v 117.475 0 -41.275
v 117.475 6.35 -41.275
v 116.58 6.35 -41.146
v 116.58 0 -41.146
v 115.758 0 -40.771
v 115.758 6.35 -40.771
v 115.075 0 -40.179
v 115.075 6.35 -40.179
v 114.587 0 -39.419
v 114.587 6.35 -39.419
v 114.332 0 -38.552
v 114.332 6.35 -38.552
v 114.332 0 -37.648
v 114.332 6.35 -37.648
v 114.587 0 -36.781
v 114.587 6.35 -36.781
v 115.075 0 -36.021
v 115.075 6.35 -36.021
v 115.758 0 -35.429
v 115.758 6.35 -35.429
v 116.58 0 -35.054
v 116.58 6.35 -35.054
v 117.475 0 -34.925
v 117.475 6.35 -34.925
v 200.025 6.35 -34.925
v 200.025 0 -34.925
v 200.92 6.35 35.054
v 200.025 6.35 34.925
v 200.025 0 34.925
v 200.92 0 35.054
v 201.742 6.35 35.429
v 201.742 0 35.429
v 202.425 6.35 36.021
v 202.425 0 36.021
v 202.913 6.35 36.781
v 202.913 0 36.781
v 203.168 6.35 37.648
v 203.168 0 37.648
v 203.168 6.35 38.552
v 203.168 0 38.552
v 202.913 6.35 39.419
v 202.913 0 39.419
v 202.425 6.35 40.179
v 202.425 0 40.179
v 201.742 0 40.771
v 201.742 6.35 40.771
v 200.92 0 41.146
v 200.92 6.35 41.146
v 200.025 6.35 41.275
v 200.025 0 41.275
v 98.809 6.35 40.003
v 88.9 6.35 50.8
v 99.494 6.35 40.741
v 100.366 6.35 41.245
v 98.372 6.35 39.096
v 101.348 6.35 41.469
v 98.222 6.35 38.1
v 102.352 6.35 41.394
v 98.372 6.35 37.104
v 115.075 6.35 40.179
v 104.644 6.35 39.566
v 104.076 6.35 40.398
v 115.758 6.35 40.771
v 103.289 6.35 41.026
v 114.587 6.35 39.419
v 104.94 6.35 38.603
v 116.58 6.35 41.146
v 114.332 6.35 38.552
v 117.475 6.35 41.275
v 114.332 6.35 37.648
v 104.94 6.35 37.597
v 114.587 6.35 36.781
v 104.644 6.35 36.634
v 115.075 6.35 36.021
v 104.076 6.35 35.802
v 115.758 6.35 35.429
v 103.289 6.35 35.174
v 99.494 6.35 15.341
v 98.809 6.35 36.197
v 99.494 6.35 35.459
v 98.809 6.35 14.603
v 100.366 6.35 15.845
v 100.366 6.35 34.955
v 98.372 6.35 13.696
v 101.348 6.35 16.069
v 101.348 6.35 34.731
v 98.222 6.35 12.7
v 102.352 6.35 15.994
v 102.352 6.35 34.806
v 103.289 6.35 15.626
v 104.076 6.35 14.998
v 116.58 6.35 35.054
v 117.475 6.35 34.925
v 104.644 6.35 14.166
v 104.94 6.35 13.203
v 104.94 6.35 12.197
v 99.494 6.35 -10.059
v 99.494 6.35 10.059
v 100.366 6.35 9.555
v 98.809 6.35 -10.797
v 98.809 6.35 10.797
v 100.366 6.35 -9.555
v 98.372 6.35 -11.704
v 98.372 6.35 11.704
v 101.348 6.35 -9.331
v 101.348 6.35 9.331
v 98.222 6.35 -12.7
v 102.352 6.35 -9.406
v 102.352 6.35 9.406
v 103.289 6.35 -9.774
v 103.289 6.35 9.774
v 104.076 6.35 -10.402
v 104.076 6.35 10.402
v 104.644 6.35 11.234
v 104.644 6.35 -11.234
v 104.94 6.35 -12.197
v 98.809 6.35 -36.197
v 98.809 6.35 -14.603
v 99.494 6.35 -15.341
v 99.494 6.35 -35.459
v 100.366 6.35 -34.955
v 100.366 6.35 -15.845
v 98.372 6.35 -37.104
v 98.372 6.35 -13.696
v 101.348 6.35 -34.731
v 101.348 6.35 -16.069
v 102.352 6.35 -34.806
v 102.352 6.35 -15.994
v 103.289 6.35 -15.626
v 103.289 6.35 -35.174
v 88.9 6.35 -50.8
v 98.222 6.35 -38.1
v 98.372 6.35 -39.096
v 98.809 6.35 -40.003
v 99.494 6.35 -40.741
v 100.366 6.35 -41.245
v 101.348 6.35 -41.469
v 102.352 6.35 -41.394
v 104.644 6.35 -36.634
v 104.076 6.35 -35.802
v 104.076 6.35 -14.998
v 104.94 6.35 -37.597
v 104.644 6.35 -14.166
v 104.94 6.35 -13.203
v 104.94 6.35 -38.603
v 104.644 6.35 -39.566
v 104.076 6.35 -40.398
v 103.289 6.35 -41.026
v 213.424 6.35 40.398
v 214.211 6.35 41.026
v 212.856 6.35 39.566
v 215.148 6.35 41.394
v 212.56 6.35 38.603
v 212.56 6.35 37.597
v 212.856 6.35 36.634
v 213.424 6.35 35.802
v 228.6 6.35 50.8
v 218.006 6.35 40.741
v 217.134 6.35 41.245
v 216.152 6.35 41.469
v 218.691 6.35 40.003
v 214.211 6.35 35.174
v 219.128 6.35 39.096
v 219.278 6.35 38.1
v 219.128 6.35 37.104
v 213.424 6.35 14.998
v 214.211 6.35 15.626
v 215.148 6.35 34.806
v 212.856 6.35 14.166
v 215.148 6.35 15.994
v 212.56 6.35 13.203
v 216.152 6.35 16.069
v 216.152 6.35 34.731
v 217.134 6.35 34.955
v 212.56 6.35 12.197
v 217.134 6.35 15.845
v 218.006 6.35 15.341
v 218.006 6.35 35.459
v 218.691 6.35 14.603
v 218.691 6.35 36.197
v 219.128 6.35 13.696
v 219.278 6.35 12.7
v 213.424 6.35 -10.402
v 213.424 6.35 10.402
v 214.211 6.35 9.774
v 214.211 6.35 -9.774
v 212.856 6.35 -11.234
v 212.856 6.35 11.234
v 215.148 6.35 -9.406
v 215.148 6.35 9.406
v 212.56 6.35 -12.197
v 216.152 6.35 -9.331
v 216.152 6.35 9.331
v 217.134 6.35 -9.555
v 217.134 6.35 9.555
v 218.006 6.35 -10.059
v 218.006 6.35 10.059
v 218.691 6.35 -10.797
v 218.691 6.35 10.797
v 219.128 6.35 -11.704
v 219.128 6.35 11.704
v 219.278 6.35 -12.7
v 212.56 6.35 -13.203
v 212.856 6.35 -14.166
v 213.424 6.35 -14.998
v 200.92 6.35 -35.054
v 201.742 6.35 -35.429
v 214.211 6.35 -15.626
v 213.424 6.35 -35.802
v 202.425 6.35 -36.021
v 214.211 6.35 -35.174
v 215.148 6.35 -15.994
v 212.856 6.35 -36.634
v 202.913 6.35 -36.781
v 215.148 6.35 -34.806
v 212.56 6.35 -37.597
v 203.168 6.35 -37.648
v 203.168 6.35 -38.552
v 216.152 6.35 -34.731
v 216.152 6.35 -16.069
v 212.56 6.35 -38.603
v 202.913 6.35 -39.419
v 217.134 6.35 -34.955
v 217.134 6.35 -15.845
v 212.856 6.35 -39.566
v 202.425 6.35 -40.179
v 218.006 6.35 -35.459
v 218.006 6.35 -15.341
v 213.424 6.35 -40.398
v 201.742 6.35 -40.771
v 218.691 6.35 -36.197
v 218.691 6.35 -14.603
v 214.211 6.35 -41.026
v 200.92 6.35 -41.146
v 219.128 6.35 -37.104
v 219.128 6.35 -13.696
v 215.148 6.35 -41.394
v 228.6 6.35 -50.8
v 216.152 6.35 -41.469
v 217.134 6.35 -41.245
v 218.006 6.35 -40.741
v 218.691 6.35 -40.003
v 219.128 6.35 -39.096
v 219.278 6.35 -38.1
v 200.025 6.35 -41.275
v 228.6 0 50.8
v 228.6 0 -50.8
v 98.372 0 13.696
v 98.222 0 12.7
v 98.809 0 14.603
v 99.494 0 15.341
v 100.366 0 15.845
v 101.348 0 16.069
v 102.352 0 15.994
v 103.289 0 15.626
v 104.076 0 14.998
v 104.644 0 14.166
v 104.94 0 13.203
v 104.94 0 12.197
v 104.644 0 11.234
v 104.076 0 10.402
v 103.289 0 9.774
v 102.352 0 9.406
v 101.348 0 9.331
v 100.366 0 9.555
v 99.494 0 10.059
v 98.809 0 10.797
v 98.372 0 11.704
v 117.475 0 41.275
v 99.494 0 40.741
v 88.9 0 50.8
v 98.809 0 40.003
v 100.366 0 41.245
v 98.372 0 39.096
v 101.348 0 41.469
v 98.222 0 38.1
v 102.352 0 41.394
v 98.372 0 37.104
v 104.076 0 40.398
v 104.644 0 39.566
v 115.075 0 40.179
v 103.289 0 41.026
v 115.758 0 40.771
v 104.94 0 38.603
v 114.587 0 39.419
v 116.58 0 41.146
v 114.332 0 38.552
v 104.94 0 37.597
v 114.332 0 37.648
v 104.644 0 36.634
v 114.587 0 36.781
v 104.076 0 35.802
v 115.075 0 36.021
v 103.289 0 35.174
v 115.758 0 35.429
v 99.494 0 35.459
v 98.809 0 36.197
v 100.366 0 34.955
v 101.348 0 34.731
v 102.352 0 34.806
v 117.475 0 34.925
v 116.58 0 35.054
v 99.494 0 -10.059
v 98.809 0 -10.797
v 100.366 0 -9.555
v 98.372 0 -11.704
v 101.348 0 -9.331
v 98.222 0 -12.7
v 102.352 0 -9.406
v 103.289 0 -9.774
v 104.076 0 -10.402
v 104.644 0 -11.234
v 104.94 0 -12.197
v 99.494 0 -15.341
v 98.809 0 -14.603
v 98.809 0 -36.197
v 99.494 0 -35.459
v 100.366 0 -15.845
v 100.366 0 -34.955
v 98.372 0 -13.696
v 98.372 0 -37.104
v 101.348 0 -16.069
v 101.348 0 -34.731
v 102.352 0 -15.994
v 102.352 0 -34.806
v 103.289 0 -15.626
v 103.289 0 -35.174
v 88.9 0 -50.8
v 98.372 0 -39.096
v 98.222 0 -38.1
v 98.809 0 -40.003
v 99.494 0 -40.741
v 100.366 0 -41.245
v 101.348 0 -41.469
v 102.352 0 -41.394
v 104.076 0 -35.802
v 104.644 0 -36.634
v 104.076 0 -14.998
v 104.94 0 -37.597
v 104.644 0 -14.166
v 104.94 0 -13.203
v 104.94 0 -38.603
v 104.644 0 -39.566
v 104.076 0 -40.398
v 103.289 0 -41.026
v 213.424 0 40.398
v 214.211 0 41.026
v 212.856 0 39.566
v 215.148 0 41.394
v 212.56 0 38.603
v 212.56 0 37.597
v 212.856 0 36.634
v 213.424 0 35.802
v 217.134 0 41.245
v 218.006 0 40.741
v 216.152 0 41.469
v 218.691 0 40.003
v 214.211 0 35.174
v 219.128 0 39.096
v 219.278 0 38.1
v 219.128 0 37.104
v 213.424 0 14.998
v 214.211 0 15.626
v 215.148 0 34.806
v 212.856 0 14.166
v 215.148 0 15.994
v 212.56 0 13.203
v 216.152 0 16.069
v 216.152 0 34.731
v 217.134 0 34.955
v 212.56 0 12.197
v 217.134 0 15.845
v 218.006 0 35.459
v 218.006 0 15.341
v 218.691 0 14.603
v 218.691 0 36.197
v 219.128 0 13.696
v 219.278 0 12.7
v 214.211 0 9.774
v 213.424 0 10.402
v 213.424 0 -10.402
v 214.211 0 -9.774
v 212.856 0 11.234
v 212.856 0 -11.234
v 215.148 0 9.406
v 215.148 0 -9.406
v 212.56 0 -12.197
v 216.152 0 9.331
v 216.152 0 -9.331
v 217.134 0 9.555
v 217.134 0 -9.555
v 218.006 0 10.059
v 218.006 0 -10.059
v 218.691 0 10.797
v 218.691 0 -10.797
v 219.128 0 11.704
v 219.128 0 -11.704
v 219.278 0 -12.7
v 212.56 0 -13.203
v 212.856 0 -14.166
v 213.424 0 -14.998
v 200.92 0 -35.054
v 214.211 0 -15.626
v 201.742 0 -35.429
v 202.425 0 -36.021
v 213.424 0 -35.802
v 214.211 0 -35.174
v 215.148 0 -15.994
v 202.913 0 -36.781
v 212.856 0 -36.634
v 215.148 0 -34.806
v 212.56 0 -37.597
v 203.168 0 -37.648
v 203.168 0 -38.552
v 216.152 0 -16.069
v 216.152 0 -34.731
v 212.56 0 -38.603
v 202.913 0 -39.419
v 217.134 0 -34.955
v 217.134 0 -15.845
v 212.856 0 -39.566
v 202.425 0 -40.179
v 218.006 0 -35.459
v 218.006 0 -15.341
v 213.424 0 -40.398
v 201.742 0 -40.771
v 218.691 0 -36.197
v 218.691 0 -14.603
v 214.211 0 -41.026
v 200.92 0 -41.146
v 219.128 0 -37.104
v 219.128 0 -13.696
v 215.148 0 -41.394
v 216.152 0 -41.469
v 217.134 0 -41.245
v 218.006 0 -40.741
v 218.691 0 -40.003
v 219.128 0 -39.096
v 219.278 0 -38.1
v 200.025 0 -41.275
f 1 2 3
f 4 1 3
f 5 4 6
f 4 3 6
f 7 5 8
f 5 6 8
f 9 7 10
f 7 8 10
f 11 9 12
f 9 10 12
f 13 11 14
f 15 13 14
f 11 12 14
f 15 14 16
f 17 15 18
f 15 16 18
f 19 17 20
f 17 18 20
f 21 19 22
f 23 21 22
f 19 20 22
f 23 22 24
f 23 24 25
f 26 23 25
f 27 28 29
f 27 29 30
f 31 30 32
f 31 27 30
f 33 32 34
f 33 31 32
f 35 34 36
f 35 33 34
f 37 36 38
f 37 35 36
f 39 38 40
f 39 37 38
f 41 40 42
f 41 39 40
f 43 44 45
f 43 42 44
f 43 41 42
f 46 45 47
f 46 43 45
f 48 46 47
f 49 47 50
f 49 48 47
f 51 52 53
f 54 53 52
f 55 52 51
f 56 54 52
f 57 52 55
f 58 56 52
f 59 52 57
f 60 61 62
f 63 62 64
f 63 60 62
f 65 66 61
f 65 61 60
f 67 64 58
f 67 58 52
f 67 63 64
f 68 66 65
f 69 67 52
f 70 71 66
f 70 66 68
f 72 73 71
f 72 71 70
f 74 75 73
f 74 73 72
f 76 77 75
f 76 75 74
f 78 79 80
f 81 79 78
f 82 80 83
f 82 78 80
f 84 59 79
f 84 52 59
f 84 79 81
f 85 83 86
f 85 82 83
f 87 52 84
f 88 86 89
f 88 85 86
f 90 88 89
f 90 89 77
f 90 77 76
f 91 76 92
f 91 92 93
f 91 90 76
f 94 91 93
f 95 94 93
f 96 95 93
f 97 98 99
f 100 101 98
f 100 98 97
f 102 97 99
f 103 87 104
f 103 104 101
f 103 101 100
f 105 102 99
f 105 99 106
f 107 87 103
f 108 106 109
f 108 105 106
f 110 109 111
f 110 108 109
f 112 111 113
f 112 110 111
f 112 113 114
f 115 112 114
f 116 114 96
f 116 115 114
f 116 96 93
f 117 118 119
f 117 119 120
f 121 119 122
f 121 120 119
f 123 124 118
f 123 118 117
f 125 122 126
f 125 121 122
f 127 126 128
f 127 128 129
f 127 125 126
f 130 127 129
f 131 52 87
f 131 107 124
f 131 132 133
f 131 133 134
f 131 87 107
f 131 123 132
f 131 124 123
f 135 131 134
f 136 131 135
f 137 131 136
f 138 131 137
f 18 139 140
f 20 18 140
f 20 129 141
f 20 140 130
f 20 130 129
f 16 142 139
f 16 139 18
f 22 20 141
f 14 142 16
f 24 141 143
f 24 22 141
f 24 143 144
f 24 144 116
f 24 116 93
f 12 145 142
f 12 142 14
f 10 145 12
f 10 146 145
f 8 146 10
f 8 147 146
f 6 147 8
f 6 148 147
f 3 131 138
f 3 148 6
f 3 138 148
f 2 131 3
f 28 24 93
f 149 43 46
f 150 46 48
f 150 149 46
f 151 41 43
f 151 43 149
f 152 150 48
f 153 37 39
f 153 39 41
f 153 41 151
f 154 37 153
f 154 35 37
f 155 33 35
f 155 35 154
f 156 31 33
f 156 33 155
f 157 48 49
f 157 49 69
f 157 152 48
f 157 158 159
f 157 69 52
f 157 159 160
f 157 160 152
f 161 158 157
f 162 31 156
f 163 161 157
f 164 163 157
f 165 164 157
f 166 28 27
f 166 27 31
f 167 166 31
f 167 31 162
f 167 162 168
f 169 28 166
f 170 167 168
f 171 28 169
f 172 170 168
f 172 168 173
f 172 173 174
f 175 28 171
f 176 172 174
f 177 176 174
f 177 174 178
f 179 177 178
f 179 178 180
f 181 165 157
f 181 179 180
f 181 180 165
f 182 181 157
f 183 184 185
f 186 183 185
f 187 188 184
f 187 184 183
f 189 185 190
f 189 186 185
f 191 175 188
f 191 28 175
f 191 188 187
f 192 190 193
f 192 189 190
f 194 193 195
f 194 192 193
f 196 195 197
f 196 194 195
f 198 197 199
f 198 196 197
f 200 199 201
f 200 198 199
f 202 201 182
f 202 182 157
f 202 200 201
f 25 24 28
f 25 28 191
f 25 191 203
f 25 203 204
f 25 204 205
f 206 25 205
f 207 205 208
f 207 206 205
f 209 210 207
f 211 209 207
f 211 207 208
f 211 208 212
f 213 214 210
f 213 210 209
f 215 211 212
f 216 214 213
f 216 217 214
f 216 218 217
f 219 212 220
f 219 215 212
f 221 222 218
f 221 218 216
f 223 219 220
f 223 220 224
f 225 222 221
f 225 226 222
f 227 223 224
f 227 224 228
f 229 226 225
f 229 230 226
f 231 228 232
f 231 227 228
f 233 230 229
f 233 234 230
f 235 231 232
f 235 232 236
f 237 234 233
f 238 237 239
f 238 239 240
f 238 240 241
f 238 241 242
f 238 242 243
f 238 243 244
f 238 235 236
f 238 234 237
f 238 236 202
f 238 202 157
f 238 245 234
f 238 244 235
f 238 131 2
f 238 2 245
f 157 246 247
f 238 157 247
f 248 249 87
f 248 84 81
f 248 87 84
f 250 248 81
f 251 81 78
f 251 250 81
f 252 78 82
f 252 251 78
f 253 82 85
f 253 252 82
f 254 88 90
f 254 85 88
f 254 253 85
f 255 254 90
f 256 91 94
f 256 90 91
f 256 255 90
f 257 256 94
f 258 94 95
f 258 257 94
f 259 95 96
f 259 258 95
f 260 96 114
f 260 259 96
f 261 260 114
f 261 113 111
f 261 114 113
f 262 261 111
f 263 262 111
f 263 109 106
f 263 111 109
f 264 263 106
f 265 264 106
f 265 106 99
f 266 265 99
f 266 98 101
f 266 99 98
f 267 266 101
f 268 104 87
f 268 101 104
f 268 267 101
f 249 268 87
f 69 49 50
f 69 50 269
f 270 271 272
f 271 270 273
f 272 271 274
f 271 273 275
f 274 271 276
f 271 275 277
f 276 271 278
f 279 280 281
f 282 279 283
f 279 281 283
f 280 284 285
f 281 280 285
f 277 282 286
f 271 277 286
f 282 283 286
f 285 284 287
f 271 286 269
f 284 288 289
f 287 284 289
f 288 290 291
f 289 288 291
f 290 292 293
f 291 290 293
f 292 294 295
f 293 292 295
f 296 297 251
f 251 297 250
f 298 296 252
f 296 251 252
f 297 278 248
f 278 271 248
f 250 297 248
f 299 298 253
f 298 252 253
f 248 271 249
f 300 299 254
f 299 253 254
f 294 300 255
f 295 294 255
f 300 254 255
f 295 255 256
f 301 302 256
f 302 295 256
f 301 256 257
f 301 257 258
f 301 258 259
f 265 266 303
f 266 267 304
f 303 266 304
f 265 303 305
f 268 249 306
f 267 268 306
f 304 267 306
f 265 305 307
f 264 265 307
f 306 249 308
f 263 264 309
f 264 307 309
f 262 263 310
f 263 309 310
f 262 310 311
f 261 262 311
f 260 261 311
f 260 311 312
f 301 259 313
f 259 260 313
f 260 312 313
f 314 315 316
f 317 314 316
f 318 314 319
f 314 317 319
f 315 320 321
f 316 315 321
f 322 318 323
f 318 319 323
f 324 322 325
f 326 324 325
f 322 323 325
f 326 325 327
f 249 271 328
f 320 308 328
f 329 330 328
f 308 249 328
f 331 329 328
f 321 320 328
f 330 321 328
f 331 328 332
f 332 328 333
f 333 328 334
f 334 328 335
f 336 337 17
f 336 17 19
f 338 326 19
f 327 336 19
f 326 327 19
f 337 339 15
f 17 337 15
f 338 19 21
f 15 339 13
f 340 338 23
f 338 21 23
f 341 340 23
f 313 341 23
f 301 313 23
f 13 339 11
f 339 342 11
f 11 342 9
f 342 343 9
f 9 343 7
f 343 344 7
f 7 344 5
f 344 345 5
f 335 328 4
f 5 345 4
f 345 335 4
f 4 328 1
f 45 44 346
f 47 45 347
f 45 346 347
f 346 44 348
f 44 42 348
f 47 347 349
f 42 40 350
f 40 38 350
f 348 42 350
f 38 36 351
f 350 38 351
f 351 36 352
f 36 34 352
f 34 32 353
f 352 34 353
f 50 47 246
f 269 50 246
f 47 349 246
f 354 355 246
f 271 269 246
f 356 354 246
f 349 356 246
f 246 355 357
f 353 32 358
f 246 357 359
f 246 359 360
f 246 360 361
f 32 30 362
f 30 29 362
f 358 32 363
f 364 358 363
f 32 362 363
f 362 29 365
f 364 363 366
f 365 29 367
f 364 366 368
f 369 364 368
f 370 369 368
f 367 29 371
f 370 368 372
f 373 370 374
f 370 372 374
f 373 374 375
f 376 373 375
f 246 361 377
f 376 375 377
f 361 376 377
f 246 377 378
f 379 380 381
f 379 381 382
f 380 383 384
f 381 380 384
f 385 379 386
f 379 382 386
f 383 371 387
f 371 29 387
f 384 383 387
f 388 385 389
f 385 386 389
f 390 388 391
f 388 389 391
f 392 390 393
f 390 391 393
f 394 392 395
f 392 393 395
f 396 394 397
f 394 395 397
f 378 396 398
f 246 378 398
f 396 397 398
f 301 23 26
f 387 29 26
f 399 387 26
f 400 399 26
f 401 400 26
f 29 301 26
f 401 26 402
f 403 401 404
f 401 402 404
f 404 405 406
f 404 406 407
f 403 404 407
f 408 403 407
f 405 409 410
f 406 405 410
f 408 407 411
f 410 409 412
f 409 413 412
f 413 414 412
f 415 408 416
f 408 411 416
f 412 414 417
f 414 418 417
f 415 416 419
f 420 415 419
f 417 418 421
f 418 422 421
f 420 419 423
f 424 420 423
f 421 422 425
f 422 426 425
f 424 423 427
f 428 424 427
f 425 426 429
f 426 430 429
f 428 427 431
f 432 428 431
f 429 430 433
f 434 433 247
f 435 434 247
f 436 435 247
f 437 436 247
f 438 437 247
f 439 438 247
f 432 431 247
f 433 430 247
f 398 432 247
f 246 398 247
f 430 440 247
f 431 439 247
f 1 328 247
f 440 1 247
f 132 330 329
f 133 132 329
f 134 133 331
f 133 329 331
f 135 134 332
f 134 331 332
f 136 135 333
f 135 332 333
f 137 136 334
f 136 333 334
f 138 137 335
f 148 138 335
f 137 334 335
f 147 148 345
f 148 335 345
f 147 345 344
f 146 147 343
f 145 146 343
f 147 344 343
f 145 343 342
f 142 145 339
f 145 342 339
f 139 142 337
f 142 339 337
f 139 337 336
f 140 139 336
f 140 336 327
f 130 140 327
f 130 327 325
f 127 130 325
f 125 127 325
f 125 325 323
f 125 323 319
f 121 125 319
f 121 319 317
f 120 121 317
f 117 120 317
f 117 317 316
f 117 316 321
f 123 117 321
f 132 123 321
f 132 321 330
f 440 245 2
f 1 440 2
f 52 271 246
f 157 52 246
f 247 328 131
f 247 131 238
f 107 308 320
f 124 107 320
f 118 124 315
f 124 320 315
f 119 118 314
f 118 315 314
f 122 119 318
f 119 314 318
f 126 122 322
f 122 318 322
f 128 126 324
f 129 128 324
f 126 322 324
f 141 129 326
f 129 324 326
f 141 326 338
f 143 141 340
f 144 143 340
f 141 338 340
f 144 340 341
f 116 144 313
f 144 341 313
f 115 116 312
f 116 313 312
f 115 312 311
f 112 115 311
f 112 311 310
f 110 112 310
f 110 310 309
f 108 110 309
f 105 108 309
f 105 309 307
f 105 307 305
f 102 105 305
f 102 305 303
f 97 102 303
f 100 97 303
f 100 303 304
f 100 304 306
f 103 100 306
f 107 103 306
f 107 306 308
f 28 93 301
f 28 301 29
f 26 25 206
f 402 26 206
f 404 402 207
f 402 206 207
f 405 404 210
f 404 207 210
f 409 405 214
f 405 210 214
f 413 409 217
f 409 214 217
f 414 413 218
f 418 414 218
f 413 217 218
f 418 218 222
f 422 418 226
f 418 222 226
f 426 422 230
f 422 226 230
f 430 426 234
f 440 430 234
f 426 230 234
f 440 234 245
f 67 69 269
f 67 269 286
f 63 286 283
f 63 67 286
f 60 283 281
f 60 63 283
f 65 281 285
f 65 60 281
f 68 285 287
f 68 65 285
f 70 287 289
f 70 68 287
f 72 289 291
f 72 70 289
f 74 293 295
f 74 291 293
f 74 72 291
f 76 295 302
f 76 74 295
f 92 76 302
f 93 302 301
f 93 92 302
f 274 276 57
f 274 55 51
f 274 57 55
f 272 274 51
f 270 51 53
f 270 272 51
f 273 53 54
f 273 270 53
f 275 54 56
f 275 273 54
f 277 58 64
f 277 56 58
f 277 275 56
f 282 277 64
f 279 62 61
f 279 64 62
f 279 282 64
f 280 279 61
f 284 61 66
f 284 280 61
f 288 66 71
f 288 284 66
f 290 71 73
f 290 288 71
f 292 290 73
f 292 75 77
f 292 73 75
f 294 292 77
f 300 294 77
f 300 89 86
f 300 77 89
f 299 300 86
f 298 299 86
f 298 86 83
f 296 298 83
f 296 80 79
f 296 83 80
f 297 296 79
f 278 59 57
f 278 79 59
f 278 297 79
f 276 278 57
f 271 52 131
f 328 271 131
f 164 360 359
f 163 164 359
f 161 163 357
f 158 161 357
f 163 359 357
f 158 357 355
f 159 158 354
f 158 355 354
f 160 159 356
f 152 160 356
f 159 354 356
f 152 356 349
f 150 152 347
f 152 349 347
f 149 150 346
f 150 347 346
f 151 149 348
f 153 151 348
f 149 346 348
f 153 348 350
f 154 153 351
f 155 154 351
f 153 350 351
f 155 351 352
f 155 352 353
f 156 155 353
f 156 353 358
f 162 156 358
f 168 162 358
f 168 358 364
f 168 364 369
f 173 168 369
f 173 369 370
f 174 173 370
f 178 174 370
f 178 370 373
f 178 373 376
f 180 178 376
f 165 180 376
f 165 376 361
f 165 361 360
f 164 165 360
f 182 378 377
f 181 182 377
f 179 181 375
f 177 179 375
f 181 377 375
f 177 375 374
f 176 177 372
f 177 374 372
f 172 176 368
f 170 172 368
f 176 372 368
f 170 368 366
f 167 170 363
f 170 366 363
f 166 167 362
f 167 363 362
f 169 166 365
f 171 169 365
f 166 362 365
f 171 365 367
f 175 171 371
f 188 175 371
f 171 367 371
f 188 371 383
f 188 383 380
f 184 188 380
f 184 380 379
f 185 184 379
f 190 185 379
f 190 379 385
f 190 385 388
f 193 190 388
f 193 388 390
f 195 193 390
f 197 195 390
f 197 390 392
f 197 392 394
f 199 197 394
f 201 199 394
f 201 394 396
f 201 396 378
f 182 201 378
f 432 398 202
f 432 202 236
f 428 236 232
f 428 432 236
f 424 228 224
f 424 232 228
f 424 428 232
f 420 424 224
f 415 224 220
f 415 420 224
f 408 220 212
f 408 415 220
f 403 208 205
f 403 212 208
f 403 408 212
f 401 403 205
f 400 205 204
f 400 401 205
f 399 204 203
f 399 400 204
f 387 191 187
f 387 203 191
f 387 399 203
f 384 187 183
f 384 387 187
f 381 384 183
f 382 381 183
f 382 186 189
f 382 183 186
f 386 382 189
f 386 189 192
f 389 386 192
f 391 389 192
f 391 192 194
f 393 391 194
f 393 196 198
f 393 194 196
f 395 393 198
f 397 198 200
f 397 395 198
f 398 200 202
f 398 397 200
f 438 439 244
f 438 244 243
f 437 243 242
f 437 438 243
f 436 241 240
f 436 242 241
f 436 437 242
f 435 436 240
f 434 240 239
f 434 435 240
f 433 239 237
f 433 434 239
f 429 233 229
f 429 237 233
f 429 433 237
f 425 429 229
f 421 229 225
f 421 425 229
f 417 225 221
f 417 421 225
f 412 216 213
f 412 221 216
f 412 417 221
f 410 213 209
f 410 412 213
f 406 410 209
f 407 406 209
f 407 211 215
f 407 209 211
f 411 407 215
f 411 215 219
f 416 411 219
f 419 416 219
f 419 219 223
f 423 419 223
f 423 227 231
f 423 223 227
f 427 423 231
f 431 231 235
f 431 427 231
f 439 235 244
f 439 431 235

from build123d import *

# Parameters (mm, degrees)
SKETCH1_W               = 457.2
SKETCH1_H               = 101.6
BOSS_EXTRUDE1_DEPTH     = 6.35
CUT_EXTRUDE1_DEPTH      = 235.26250767
F_1_4_CLEARANCE_HOLE1_D = 6.7564
MIRROR4_COPY_1_D        = 6.7564
CUT_EXTRUDE2_DEPTH      = 235.26250767
SKETCH7_W               = 317.5
SKETCH7_H               = 101.6
CUT_EXTRUDE3_DEPTH      = 235.26250767
F_1_4_CLEARANCE_HOLE2_D = 6.7564


with BuildPart() as part:
    # Sketch1 → Boss-Extrude1 (new body)
    with BuildSketch(Plane(origin=(0, 0, 0), x_dir=(1, 0, 0), z_dir=(0, 1, 0))):
        Rectangle(SKETCH1_W, SKETCH1_H)
    extrude(amount=BOSS_EXTRUDE1_DEPTH)

    # Sketch2 → Cut-Extrude1 (cut, through all)
    with BuildSketch(Plane(origin=(0, 6.35, 0), x_dir=(1, 0, 0), z_dir=(0, 1, 0))):
        with BuildLine():
            Line((200.025, -41.275), (117.475, -41.275))
            ThreePointArc((117.475, -41.275), (114.3, -38.1), (117.475, -34.925))
            Line((117.475, -34.925), (200.025, -34.925))
            ThreePointArc((200.025, -34.925), (203.2, -38.1), (200.025, -41.275))
        make_face()
    cut_extrude1 = extrude(amount=-CUT_EXTRUDE1_DEPTH, mode=Mode.SUBTRACT)

    # Mirror1: Cut-Extrude1 across plane
    add(cut_extrude1.mirror(Plane.XY), mode=Mode.SUBTRACT)

    # 1/4 Clearance Hole1 (through all)
    with Locations(Plane(origin=(0, 6.35, 0), x_dir=(1, 0, 0), z_dir=(0, 1, 0))):
        with Locations((-215.9, 12.7), (-215.9, 38.1)):
            f_1_4_clearance_hole1 = Hole(F_1_4_CLEARANCE_HOLE1_D / 2)

    # Mirror3: 1/4 Clearance Hole1 across plane
    add(f_1_4_clearance_hole1.mirror(Plane.XY), mode=Mode.SUBTRACT)

    # Mirror4: 1/4 Clearance Hole1 across plane
    add(f_1_4_clearance_hole1.mirror(Plane(origin=(0, 0, 0), x_dir=(0, 0, 1), z_dir=(1, 0, 0))), mode=Mode.SUBTRACT)

    # Mirror4 copy 1 (through all)
    with Locations(Plane(origin=(0, 6.35, 0), x_dir=(-1, 0, 0), z_dir=(0, 1, 0))):
        with Locations((-215.9, 12.7), (-215.9, 38.1)):
            Hole(MIRROR4_COPY_1_D / 2)

    # Sketch6 → Cut-Extrude2 (cut, through all)
    with BuildSketch(Plane(origin=(0, 6.35, 0), x_dir=(1, 0, 0), z_dir=(0, 1, 0))):
        with BuildLine():
            Line((-190.5, 41.275), (-63.5, 41.275))
            ThreePointArc((-63.5, 41.275), (-60.325, 38.1), (-63.5, 34.925))
            Line((-63.5, 34.925), (-190.5, 34.925))
            ThreePointArc((-190.5, 34.925), (-193.675, 38.1), (-190.5, 41.275))
        make_face()
    cut_extrude2 = extrude(amount=-CUT_EXTRUDE2_DEPTH, mode=Mode.SUBTRACT)

    # Mirror5: Cut-Extrude2 across plane
    add(cut_extrude2.mirror(Plane.XY), mode=Mode.SUBTRACT)

    # Sketch7 → Cut-Extrude3 (cut, through all)
    with BuildSketch(Plane(origin=(0, 6.35, 0), x_dir=(1, 0, 0), z_dir=(0, 1, 0))):
        with Locations((-69.85, 0)):
            Rectangle(SKETCH7_W, SKETCH7_H)
    extrude(amount=-CUT_EXTRUDE3_DEPTH, mode=Mode.SUBTRACT)

    # 1/4 Clearance Hole2 (through all)
    with Locations(Plane(origin=(0, 6.35, 0), x_dir=(1, 0, 0), z_dir=(0, 1, 0))):
        with Locations((101.6, 38.1), (101.6, 12.7)):
            f_1_4_clearance_hole2 = Hole(F_1_4_CLEARANCE_HOLE2_D / 2)

    # Mirror8: 1/4 Clearance Hole2 across plane
    add(f_1_4_clearance_hole2.mirror(Plane.XY), mode=Mode.SUBTRACT)


solid = part.part
